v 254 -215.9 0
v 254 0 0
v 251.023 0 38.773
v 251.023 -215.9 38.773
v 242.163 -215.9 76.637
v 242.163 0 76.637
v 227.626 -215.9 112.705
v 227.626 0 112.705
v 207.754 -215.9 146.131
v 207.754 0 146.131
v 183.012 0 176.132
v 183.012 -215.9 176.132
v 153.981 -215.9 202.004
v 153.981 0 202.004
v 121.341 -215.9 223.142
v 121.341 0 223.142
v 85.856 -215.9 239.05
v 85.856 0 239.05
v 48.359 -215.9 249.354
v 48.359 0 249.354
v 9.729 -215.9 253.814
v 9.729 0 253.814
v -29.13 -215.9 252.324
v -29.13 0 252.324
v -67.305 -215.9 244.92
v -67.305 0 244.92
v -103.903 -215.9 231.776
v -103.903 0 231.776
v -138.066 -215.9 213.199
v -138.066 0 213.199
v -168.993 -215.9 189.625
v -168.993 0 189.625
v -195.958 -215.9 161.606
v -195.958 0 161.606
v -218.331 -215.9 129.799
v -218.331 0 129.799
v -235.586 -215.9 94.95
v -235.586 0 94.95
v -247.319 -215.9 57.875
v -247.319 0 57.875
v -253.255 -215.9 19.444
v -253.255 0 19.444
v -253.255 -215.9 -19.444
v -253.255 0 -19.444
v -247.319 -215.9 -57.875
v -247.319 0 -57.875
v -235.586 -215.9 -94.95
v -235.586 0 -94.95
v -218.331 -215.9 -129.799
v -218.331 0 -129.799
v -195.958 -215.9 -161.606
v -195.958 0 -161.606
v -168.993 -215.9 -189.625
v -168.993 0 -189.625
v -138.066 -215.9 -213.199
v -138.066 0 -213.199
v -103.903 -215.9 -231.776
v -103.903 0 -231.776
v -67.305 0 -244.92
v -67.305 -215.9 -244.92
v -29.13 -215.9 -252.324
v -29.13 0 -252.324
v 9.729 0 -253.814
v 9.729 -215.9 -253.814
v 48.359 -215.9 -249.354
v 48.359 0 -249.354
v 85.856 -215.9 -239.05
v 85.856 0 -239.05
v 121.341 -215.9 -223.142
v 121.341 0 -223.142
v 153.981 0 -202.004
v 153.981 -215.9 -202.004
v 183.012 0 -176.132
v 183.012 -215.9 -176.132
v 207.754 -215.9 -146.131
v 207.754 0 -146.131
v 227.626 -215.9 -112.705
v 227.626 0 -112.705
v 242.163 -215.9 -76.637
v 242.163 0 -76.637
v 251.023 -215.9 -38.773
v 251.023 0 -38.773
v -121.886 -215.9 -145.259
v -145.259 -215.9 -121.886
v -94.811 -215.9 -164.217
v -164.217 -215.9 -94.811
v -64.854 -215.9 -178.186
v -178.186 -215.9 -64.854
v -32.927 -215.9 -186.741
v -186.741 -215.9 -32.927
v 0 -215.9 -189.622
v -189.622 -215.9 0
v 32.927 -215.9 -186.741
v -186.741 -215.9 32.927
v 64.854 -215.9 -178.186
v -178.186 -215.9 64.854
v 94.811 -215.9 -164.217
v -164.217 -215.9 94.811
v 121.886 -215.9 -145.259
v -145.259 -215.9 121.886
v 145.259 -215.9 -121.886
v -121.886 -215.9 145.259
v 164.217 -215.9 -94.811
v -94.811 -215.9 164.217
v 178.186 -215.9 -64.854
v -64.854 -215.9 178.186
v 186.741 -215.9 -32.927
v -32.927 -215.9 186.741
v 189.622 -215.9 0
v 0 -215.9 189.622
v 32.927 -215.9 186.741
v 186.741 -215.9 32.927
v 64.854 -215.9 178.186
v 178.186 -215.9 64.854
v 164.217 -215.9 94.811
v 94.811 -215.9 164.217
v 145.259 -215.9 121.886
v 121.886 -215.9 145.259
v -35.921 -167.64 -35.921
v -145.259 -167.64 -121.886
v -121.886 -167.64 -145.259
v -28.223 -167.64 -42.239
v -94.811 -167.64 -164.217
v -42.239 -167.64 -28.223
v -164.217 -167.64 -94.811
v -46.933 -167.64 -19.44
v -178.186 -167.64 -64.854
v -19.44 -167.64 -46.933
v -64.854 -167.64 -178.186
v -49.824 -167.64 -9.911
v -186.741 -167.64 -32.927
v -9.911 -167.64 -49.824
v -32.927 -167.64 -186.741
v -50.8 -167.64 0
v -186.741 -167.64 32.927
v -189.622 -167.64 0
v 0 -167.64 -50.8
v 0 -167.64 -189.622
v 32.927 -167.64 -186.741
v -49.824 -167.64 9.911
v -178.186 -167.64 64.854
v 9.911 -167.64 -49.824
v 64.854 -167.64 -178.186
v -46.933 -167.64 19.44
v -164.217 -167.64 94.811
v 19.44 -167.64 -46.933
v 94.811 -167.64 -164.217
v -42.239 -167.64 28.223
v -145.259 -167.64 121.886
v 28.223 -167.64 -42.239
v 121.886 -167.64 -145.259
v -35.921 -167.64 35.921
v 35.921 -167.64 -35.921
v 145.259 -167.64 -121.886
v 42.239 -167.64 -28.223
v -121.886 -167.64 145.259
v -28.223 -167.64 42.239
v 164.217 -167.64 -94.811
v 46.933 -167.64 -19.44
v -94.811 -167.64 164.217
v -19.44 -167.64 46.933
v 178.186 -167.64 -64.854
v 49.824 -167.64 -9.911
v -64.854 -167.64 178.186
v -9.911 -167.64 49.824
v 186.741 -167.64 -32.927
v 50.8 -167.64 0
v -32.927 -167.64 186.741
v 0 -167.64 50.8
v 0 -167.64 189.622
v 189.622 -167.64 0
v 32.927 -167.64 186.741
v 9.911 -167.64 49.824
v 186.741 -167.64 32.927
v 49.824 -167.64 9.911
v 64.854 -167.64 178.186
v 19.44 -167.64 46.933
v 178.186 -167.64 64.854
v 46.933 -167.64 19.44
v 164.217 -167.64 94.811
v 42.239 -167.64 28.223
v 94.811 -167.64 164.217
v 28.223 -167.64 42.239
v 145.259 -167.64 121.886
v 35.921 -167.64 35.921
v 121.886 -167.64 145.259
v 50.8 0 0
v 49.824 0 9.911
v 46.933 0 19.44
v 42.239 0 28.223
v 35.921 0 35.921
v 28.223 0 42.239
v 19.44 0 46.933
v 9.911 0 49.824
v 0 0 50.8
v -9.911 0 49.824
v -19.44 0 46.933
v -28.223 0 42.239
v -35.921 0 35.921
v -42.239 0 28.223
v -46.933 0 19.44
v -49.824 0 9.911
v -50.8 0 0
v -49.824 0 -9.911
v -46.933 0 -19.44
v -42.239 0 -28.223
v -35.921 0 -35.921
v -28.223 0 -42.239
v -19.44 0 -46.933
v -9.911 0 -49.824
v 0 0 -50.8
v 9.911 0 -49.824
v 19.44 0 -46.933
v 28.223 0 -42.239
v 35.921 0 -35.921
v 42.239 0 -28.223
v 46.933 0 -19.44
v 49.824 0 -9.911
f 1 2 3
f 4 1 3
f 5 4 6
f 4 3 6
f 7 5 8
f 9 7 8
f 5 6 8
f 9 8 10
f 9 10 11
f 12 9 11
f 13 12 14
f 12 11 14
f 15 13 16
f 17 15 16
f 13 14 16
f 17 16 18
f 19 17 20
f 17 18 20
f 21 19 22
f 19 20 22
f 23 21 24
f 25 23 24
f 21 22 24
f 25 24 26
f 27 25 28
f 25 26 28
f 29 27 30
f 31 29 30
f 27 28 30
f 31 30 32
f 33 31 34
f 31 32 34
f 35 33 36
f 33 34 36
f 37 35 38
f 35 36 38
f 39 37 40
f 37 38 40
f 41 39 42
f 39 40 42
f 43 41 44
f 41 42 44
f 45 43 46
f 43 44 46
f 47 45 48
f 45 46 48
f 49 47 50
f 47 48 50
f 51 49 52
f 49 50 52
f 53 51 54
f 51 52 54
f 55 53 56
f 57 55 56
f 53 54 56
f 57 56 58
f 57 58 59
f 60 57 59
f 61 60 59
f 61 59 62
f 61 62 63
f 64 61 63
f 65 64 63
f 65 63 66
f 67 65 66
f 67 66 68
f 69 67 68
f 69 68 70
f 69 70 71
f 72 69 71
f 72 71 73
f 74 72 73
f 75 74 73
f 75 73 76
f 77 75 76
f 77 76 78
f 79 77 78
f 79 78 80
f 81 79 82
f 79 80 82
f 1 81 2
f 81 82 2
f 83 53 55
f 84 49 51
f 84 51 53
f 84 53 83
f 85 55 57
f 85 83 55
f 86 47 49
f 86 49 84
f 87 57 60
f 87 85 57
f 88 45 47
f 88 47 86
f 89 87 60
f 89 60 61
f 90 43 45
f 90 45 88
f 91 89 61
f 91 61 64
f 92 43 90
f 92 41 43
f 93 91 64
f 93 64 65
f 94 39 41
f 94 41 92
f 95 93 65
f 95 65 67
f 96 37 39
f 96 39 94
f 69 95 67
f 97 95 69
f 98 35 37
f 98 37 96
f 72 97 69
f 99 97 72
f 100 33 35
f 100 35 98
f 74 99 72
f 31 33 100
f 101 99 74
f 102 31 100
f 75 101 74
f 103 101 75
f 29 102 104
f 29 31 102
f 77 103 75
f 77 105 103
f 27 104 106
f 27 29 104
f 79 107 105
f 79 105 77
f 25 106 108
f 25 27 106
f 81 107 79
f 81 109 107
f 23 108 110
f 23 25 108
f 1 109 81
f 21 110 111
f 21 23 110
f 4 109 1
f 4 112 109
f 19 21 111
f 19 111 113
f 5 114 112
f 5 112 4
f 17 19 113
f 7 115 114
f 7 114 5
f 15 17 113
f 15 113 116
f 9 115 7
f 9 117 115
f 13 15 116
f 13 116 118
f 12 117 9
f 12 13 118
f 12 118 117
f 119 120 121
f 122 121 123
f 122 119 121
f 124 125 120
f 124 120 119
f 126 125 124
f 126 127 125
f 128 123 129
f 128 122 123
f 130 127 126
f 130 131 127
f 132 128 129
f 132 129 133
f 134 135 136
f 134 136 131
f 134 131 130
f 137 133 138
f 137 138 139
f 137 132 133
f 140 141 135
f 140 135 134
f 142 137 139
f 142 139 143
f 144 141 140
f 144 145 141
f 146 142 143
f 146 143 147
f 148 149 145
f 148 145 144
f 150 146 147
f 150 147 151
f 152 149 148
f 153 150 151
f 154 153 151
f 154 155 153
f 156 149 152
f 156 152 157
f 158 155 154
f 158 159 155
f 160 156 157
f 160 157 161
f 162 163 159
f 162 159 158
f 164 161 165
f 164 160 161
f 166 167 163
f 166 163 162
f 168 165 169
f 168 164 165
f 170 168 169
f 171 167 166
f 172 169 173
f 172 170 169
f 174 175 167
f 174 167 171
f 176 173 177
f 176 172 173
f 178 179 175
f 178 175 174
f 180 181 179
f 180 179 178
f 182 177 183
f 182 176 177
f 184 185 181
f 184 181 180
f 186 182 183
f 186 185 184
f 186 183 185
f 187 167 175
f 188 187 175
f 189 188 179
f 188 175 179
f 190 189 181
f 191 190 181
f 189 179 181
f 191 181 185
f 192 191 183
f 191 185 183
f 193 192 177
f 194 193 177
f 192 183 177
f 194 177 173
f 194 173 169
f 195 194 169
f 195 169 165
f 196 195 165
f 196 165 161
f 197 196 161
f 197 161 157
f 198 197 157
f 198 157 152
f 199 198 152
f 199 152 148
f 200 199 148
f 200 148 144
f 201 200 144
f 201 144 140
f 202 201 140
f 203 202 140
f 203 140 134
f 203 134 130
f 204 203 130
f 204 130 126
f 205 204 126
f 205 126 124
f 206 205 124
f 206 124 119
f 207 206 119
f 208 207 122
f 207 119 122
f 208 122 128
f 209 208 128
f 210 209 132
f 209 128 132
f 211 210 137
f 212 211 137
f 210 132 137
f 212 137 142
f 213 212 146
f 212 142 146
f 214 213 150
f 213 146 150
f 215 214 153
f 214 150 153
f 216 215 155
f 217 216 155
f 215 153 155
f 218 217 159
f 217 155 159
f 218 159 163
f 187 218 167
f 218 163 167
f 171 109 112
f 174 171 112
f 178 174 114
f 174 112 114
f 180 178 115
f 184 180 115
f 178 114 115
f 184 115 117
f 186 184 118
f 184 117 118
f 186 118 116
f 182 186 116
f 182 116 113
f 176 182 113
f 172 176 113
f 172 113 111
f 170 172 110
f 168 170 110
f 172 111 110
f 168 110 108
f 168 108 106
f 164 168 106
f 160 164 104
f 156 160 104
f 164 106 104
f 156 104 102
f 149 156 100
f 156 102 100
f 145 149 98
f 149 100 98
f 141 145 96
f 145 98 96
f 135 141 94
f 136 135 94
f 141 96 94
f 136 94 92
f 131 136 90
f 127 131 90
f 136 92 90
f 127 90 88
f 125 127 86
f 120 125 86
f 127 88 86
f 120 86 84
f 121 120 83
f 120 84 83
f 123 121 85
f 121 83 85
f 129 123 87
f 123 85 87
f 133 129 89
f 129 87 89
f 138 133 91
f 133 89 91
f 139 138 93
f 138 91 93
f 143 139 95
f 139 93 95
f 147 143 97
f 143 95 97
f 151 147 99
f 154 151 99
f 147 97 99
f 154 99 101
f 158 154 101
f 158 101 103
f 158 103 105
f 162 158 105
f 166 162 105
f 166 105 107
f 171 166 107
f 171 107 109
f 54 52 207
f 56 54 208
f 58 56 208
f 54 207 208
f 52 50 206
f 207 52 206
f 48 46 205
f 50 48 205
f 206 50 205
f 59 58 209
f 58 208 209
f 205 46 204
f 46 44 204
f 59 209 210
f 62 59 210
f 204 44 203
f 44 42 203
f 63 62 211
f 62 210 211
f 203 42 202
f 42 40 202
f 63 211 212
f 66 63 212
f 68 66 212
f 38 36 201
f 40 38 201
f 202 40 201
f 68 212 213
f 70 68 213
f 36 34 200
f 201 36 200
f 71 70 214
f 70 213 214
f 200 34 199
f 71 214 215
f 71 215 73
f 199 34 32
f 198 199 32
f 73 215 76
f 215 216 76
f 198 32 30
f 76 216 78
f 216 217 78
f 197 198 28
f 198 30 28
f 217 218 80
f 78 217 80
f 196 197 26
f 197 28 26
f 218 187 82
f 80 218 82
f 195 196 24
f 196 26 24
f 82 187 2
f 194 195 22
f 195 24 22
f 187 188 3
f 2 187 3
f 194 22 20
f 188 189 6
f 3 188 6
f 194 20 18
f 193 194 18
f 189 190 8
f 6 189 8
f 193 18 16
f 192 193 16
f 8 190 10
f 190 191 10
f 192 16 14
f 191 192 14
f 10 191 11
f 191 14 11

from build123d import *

# Parameters (mm, degrees)
F0_R     = 254
F1_DEPTH = 215.9
F2_R     = 50.8
F3_DEPTH = 215.901
F4_R     = 189.621559
F5_DEPTH = 48.26


with BuildPart() as f1:
    # F0 (on Front) → F1 (new body)
    with BuildSketch(Plane.XZ):
        Circle(F0_R)
    extrude(amount=F1_DEPTH)

    # F2 (on face) → F3 (cut, through all)
    with BuildSketch(Plane.XZ.offset(215.9)):
        Circle(F2_R)
    extrude(amount=-F3_DEPTH, mode=Mode.SUBTRACT)

    # F4 (on face) → F5 (cut)
    with BuildSketch(Plane.XZ.offset(215.9)):
        Circle(F4_R)
    extrude(amount=-F5_DEPTH, mode=Mode.SUBTRACT)


solid = f1.part
